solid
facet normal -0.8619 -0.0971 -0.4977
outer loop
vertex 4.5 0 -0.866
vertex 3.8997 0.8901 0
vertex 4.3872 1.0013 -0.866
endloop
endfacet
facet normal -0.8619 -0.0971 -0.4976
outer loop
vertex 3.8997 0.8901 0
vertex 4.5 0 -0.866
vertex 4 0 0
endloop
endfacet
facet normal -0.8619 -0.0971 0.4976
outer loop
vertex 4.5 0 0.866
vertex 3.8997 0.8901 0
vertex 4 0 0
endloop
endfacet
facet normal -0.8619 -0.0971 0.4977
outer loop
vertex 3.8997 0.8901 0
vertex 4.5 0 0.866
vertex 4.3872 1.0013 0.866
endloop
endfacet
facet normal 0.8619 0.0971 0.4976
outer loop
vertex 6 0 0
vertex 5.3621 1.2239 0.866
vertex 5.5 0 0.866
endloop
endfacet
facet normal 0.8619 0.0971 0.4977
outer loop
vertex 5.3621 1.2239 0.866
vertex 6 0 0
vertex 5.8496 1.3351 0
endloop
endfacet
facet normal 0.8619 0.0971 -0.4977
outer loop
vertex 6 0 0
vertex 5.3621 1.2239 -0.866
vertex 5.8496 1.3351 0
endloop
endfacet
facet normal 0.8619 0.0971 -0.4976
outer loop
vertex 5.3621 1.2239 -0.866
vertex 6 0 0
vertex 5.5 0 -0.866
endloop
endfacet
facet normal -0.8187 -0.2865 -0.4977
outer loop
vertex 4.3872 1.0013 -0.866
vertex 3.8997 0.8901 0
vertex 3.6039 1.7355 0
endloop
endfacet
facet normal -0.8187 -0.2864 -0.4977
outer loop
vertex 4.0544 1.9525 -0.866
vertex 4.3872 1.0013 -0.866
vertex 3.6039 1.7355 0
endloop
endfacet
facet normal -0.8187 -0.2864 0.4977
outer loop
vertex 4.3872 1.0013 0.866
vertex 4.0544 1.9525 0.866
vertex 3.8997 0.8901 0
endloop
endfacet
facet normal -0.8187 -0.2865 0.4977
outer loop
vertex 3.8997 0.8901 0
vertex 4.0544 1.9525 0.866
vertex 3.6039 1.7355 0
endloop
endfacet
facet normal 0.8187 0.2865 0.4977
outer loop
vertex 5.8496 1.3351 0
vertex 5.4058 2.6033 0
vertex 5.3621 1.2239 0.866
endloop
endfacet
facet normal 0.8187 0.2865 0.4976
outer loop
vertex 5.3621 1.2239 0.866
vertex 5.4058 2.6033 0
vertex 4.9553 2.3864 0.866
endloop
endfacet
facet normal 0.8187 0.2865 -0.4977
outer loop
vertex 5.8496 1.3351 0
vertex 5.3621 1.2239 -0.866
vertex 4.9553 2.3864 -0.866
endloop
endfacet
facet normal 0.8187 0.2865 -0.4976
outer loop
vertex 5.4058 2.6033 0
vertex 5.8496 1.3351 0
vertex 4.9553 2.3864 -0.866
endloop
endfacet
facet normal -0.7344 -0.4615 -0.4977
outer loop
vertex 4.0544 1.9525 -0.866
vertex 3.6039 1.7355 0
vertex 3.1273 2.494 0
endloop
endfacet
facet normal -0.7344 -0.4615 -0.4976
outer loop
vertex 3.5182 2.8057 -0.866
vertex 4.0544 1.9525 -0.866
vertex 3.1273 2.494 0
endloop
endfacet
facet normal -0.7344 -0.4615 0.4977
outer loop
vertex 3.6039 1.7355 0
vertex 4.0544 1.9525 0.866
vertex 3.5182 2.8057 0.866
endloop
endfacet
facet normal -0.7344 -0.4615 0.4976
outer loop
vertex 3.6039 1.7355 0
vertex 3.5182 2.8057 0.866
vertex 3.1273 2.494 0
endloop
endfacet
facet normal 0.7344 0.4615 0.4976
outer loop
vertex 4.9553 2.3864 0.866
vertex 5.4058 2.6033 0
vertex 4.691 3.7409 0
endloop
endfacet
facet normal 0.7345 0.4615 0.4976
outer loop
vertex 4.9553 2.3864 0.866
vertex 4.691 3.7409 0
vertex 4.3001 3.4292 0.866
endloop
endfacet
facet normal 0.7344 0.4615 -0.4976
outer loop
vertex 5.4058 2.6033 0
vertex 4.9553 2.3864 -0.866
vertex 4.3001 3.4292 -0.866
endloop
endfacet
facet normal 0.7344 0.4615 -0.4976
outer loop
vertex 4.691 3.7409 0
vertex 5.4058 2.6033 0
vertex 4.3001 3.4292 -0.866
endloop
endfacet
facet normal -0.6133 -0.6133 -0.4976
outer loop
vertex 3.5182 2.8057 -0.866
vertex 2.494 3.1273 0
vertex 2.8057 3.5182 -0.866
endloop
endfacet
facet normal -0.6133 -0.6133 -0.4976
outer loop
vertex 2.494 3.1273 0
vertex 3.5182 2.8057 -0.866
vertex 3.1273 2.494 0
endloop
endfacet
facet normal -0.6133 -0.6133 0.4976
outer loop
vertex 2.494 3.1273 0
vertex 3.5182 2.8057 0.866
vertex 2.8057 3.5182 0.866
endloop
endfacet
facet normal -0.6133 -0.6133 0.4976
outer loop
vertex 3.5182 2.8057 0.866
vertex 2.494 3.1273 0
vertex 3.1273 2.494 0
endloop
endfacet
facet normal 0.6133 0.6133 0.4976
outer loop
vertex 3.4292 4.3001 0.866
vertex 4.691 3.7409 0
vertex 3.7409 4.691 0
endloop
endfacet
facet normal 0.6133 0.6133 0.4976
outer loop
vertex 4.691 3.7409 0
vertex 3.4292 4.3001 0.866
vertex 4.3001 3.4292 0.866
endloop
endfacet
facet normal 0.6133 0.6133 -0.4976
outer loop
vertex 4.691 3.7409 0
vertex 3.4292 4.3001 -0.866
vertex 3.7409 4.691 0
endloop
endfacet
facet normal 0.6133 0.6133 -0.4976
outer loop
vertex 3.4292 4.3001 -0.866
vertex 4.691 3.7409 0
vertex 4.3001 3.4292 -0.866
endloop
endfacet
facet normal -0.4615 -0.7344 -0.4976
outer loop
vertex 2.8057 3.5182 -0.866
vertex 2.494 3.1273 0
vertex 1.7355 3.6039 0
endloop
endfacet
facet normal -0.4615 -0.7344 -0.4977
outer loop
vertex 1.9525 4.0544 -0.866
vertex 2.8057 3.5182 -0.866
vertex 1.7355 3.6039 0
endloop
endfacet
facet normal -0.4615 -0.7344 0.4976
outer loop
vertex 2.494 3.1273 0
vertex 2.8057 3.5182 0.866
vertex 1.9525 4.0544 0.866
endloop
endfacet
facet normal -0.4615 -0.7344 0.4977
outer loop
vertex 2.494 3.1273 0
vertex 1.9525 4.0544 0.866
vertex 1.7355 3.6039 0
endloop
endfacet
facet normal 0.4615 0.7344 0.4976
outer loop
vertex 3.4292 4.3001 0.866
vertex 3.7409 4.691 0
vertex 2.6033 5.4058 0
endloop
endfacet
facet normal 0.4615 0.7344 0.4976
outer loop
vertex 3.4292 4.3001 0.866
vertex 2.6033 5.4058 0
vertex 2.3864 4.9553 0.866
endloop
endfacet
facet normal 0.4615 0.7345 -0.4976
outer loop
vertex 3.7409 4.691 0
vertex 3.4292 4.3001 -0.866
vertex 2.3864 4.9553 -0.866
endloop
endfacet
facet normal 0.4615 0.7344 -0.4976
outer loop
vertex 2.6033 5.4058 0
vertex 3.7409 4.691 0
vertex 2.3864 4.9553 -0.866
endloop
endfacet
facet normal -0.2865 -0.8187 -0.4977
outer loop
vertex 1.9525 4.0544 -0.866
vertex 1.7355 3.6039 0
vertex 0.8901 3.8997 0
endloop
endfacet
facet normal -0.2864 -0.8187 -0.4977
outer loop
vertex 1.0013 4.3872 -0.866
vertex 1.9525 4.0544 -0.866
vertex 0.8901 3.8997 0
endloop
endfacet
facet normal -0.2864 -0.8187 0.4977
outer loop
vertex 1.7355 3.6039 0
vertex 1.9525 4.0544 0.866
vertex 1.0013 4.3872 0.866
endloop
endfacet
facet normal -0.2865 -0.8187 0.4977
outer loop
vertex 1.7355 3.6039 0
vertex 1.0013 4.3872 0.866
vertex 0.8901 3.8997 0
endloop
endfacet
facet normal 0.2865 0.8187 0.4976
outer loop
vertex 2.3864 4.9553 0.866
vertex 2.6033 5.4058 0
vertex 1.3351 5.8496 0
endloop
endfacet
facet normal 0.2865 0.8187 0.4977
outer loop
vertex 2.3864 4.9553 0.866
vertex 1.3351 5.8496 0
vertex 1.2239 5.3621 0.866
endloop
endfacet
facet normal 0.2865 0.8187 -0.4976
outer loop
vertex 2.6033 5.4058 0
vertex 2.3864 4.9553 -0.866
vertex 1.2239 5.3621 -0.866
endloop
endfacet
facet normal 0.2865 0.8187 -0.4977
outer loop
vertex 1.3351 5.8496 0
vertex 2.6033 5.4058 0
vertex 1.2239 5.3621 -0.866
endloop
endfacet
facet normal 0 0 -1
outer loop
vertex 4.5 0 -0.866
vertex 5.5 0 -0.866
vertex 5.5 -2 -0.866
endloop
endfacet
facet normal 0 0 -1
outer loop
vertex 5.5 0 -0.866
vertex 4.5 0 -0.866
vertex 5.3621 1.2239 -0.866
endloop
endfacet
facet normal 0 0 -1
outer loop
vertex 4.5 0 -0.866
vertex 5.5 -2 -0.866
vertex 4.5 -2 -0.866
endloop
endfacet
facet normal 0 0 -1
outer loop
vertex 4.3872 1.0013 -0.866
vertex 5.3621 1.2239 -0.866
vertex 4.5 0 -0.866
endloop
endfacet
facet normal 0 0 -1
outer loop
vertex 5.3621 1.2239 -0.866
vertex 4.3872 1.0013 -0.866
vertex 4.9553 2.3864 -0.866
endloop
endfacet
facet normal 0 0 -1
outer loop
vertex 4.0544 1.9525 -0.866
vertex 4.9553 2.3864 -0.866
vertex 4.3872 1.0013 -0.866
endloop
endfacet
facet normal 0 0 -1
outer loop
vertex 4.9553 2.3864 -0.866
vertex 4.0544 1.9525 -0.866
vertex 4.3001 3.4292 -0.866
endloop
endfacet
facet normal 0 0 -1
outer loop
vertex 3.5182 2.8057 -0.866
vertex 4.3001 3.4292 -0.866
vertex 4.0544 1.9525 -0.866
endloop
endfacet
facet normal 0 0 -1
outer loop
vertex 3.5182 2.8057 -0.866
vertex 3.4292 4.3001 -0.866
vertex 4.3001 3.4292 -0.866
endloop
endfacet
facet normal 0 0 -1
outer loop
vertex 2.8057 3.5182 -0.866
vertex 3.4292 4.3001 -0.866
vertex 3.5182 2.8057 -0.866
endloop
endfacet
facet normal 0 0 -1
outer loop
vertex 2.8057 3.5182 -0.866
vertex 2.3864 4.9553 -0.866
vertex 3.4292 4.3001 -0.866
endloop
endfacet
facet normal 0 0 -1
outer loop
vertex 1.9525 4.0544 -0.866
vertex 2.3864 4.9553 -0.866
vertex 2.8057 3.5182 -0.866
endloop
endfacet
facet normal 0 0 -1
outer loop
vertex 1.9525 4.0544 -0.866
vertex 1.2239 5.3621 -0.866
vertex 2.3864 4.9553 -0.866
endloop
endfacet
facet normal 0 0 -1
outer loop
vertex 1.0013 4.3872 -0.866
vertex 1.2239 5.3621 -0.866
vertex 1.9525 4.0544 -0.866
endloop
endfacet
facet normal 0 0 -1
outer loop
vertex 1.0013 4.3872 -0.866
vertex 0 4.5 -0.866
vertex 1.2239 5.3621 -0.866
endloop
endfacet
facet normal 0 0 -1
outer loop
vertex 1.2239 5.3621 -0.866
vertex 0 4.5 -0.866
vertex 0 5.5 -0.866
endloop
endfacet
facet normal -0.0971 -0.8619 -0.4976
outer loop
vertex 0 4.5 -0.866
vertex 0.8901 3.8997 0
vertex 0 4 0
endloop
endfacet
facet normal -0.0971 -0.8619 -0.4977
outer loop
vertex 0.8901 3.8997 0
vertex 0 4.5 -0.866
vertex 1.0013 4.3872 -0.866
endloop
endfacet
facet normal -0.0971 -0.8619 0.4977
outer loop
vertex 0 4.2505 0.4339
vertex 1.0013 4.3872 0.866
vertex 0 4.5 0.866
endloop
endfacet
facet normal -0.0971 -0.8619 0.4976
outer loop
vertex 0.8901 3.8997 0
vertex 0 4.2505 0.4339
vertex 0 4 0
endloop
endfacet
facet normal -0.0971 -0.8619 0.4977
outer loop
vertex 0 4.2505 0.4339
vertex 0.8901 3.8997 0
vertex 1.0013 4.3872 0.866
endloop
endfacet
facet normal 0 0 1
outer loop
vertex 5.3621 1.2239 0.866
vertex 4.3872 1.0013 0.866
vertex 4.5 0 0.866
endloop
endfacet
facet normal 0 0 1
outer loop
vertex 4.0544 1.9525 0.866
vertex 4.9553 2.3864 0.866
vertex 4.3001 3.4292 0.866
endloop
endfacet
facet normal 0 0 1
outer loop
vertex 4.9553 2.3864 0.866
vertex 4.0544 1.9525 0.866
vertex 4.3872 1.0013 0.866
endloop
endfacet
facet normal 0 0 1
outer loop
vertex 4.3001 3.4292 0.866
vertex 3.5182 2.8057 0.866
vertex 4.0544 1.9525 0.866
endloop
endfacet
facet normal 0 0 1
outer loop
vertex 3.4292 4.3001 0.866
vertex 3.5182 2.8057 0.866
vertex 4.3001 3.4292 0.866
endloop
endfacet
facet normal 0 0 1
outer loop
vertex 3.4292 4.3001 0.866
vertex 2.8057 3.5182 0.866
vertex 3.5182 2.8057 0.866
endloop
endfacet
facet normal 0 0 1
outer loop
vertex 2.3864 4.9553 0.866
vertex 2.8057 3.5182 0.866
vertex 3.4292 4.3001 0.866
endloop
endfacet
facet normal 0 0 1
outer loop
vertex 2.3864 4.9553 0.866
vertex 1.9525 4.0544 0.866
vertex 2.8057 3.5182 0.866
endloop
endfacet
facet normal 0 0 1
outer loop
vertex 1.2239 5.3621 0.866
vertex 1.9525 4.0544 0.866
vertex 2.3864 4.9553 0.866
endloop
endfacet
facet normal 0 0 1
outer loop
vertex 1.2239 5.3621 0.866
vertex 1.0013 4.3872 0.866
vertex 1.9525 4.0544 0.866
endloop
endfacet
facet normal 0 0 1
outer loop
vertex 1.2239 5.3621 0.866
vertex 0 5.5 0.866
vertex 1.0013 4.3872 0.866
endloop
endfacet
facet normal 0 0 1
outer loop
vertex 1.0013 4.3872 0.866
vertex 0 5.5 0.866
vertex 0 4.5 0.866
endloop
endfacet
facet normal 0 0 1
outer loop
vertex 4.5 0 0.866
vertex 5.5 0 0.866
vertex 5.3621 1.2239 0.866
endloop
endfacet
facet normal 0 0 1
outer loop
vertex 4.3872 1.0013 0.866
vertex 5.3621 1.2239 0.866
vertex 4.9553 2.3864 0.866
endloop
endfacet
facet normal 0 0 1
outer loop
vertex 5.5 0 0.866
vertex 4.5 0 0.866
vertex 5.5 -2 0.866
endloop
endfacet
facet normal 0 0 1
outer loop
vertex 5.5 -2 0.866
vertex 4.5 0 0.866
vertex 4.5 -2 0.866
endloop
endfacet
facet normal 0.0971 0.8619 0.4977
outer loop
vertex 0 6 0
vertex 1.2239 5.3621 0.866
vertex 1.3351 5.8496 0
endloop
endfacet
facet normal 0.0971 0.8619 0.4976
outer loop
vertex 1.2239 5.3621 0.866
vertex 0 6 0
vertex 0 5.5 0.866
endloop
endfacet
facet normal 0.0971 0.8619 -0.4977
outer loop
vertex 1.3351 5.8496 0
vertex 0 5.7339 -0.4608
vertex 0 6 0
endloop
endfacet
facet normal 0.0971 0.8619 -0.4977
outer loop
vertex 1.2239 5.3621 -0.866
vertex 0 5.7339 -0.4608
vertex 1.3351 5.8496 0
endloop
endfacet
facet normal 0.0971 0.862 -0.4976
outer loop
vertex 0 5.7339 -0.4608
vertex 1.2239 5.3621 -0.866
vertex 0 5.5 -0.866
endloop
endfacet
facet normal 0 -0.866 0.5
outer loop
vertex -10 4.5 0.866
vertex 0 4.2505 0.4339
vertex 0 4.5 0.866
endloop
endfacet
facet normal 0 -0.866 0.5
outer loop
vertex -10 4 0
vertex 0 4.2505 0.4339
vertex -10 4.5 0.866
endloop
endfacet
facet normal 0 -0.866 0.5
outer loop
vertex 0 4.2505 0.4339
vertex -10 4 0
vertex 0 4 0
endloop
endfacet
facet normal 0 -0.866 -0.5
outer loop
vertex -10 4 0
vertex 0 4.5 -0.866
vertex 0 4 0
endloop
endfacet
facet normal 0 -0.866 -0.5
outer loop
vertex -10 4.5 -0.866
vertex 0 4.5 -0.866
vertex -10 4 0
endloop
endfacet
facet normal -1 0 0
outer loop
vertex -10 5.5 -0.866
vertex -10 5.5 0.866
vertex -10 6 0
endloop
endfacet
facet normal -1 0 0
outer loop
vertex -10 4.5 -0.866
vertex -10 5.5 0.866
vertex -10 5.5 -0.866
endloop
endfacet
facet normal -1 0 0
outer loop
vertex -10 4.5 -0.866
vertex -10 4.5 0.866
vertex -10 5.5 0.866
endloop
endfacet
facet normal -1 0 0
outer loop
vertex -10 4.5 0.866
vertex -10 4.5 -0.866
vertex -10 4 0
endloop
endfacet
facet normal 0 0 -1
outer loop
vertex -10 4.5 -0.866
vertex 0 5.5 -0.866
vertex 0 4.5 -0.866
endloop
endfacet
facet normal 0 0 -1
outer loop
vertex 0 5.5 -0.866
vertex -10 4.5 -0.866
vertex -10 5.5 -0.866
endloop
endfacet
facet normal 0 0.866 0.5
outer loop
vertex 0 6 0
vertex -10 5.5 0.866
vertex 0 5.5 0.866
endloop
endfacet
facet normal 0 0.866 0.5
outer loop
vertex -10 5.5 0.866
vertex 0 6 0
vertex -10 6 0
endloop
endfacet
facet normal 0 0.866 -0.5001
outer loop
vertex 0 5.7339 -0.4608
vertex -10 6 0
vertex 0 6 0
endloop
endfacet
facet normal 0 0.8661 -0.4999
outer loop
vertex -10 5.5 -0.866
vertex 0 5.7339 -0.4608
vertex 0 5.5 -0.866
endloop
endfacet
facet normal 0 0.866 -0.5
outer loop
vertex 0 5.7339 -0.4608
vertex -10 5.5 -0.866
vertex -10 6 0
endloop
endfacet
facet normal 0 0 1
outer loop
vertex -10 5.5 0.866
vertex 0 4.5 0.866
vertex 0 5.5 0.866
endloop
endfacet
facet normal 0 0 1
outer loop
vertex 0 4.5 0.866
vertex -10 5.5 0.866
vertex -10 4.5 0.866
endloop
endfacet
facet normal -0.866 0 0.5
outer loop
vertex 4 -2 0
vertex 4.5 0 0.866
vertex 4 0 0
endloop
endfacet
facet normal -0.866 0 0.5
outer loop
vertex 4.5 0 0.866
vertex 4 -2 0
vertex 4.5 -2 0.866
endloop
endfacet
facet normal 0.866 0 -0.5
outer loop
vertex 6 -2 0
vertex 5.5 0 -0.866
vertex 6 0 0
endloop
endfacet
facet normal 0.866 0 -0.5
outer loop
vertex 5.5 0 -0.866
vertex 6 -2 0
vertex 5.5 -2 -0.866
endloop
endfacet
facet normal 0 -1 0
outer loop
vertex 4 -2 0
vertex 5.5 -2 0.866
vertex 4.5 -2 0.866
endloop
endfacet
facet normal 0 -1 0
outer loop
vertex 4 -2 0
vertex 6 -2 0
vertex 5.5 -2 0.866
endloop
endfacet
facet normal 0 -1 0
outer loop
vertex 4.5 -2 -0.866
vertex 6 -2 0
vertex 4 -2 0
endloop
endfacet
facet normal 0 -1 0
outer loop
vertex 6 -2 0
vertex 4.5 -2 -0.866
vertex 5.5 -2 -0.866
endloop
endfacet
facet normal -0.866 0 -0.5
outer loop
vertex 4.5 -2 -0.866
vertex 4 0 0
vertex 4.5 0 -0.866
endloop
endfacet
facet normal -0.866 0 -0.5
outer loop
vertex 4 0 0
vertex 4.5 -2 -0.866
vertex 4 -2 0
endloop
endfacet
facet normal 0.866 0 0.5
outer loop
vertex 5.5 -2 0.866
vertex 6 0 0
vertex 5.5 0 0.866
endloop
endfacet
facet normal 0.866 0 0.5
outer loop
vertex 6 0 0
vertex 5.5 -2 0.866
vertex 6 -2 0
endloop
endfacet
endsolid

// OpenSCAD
module Hexagon_socket_screw_keys(){

    module regular_polygon(order = 6, r=1){
         angles=[ for (i = [0:order-1]) i*(360/order) ];
         coords=[ for (th=angles) [r*cos(th), r*sin(th)] ];
         polygon(coords);
     }
     
    color("#a8b0b2")
    rotate_extrude(angle = 90, $fn = 30)
    translate([5,0,0])
    regular_polygon(); 
     
    translate([0,5,0])

    color("#a8b0b2")
    rotate([30,0,0])
    rotate([00,-90,00])
    linear_extrude(height = 10) 

    //translate([5,0,0])
    regular_polygon(); 
     
    color("#a8b0b2")
    translate([5,0,0])
    rotate([90,-0,00])
    linear_extrude(height = 2) 

    //translate([5,0,0])
    regular_polygon(); 
      
  
}

Hexagon_socket_screw_keys();


// Written by Nicolì Angelo (Gengio) 2024: 
// MIT License

//Permission is hereby granted, free of charge, to any person obtaining a copy of this software and associated documentation files (the "Software"), to deal in the Software without restriction, including without limitation the rights to use, copy, modify, merge, publish, distribute, sublicense, and/or sell copies of the Software, and to permit persons to whom the Software is furnished to do so, subject to the following conditions:

//The above copyright notice and this permission notice shall be included in all copies or substantial portions of the Software.

//THE SOFTWARE IS PROVIDED "AS IS", WITHOUT WARRANTY OF ANY KIND, EXPRESS OR IMPLIED, INCLUDING BUT NOT LIMITED TO THE WARRANTIES OF MERCHANTABILITY, FITNESS FOR A PARTICULAR PURPOSE AND NONINFRINGEMENT. IN NO EVENT SHALL THE AUTHORS OR COPYRIGHT HOLDERS BE LIABLE FOR ANY CLAIM, DAMAGES OR OTHER LIABILITY, WHETHER IN AN ACTION OF CONTRACT, TORT OR OTHERWISE, ARISING FROM, OUT OF OR IN CONNECTION WITH THE SOFTWARE OR THE USE OR OTHER DEALINGS IN THE SOFTWARE.
